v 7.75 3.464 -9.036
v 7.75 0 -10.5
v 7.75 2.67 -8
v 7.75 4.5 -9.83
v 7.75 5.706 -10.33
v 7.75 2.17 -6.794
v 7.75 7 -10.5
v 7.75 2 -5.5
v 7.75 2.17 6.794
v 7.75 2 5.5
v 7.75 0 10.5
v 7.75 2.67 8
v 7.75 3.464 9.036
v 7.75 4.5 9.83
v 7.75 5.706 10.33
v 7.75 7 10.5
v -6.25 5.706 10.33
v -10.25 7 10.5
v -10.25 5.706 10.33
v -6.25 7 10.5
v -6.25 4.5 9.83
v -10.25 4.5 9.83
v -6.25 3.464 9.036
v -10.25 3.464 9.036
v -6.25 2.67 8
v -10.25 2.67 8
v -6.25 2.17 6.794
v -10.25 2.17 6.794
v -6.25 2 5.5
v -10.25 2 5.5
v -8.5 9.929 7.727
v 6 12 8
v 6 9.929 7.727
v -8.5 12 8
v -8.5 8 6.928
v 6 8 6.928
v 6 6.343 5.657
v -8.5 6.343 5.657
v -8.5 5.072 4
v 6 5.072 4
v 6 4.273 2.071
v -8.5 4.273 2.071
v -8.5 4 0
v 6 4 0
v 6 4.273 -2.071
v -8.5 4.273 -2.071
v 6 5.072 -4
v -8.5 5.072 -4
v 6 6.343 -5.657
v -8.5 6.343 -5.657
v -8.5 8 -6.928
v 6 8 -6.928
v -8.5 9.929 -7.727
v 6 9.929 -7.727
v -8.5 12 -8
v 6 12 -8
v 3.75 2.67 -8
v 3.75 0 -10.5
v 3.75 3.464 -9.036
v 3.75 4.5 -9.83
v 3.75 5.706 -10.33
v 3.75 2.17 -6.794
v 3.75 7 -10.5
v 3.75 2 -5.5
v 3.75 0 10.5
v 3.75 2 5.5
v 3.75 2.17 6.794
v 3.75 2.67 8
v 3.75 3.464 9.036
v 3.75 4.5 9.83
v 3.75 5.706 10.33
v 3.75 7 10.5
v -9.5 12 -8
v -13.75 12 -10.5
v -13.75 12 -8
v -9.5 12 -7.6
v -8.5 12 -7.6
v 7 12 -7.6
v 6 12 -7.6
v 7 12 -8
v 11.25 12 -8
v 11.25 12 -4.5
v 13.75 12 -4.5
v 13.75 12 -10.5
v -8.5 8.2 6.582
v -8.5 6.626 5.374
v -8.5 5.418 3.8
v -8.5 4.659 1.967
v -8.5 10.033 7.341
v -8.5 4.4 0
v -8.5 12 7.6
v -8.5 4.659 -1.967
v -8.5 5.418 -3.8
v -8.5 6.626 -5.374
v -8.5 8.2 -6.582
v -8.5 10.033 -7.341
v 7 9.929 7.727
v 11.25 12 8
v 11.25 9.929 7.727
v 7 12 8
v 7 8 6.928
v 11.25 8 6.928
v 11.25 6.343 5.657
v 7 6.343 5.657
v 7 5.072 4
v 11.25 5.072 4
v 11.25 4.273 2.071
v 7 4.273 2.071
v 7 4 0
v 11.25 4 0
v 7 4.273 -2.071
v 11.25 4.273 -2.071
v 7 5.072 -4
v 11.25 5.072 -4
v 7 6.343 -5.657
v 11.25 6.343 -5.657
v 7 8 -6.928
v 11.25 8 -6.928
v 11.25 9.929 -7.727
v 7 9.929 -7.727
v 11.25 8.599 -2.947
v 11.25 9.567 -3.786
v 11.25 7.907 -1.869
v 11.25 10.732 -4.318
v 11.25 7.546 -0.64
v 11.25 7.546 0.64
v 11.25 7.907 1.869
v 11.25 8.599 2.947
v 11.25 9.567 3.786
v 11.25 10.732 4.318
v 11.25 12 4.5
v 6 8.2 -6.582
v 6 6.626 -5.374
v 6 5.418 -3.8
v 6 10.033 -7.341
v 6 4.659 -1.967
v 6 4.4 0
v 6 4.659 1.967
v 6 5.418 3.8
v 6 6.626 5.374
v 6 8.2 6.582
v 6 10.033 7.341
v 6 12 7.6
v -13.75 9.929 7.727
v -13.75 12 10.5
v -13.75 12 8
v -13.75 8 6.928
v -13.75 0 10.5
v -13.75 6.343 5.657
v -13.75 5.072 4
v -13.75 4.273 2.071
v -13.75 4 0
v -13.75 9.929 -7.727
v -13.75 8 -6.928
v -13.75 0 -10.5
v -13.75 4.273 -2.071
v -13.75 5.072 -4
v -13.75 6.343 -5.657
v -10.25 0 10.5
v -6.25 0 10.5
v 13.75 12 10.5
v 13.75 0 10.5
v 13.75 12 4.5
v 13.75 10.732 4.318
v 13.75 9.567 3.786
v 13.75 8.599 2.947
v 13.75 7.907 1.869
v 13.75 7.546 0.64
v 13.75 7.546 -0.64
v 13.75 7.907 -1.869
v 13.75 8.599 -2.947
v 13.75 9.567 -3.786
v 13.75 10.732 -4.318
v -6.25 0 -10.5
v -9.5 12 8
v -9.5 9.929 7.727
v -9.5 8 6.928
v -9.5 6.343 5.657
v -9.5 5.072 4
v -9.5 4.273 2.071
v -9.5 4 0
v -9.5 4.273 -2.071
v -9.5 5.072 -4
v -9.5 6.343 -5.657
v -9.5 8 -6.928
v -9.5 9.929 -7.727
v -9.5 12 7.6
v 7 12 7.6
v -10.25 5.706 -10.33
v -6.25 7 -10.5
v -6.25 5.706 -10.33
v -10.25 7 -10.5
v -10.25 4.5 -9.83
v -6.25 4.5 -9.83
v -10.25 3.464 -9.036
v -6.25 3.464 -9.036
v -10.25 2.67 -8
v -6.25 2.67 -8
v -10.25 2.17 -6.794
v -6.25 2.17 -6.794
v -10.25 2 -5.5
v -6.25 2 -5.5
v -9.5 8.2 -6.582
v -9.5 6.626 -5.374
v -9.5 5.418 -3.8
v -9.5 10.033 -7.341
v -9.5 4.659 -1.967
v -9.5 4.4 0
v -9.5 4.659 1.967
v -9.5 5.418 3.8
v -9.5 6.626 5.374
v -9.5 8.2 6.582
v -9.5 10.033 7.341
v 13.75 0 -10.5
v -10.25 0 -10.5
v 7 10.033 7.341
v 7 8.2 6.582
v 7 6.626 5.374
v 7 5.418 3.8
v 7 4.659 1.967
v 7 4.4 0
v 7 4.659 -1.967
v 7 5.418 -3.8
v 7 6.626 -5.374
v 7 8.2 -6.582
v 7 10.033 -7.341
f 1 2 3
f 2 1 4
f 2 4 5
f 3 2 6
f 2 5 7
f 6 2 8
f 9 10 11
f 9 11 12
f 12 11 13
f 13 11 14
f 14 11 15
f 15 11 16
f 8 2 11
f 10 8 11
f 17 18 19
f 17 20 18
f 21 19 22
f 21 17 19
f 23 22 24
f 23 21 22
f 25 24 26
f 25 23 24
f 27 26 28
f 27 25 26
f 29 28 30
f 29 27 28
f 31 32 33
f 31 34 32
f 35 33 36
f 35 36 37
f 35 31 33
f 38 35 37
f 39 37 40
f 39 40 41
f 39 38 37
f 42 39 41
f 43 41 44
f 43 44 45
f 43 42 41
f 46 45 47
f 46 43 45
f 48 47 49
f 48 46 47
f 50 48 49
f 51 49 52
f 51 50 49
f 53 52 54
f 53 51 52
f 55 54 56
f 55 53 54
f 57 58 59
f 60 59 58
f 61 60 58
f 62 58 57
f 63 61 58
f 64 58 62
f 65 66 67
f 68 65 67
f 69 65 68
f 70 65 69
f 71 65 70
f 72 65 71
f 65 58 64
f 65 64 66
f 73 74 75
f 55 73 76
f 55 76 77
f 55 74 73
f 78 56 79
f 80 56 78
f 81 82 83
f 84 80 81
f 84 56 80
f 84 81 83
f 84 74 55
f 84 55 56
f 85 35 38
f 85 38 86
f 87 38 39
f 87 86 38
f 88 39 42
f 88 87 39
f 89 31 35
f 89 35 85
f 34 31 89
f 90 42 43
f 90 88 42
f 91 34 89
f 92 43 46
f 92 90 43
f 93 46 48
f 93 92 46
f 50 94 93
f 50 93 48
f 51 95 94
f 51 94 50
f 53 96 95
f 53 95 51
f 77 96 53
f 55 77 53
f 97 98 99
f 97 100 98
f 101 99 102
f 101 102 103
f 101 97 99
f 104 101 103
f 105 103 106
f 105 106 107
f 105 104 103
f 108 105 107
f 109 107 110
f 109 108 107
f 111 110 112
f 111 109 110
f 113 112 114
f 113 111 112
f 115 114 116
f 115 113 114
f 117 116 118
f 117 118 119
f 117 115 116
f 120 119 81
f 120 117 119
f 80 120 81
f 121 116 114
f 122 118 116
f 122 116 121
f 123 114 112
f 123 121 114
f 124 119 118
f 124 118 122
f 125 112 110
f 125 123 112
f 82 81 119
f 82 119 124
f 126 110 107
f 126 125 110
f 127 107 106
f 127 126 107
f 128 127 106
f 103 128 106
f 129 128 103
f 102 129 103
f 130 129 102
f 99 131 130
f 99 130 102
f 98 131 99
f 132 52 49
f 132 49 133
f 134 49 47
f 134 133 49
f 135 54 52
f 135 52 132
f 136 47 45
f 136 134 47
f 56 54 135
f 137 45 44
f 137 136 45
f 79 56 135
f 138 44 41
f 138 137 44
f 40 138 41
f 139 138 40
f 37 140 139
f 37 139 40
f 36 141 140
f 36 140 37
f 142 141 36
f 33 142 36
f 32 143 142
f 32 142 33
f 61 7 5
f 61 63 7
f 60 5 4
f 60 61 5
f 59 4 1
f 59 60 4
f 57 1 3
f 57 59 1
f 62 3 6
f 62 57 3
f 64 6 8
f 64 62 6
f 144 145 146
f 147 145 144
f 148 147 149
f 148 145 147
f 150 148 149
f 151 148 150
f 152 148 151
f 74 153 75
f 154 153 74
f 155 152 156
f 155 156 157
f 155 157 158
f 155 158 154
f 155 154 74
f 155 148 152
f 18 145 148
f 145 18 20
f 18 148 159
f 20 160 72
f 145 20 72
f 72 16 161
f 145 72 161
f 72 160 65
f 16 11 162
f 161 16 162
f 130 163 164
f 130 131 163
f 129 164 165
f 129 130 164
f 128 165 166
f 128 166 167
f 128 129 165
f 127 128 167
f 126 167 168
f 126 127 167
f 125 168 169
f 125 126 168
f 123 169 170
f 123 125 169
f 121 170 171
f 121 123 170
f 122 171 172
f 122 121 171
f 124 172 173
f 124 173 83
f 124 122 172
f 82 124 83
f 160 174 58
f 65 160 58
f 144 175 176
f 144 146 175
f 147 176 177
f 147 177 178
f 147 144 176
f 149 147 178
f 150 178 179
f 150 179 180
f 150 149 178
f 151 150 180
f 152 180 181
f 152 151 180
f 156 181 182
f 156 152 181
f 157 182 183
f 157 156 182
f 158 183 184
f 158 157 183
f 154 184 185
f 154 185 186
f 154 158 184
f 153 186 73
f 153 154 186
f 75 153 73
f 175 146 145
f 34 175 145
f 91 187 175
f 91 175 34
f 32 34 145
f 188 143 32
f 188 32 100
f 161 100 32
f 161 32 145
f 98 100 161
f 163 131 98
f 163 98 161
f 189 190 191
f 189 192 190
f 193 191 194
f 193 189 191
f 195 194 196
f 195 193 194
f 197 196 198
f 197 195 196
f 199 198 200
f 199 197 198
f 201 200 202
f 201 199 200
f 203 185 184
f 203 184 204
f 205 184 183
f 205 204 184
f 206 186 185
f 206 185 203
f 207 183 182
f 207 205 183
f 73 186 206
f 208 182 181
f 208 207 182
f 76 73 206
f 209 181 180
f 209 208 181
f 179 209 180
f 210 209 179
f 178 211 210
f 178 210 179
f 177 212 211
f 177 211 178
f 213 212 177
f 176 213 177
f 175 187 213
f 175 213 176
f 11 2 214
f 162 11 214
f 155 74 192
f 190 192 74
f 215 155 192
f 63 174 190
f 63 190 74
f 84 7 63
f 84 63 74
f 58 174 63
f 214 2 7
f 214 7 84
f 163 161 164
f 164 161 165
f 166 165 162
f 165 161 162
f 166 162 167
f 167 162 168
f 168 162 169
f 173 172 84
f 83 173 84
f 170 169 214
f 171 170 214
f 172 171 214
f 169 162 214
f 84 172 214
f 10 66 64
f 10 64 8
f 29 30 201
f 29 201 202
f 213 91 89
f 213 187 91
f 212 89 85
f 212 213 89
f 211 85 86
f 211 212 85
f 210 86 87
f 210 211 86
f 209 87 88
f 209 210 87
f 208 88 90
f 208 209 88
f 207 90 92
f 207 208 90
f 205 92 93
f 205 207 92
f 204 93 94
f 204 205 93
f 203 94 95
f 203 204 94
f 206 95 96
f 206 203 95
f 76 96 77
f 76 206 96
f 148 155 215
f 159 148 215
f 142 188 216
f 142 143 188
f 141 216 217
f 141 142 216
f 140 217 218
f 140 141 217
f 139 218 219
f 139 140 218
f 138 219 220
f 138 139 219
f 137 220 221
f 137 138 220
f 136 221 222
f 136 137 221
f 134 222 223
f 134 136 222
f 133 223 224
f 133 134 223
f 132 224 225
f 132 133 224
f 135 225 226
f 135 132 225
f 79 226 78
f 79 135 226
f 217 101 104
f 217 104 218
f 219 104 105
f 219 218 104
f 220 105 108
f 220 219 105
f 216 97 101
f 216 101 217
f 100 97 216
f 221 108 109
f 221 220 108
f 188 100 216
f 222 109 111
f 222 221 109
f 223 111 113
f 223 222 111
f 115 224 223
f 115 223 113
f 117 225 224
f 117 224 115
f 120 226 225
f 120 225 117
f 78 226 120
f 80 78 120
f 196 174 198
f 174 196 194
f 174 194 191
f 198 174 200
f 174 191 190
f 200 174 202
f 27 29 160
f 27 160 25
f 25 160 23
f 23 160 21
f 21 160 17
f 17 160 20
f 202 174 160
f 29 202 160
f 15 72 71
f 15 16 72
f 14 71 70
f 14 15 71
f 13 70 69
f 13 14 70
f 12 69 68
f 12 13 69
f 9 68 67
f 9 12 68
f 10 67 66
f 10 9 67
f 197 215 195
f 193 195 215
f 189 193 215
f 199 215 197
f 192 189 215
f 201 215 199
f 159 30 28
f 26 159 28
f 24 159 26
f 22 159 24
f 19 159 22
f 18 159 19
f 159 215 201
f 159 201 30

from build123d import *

# Parameters (mm, degrees)
SKETCH1_W           = 27.5
SKETCH1_H           = 21
BOSS_EXTRUDE1_DEPTH = 12
SKETCH4_W           = 4
SKETCH4_H           = 2
CUT_EXTRUDE1_DEPTH  = 28.821978722
FILLET1_R           = 5


with BuildPart() as part:
    # Sketch1 → Boss-Extrude1 (new body)
    with BuildSketch(Plane(origin=(0, 0, 0), x_dir=(1, 0, 0), z_dir=(0, 1, 0))):
        Rectangle(SKETCH1_W, SKETCH1_H)
    extrude(amount=BOSS_EXTRUDE1_DEPTH)

    # Sketch2 → Cut-Revolve1 (revolve, cut)
    with BuildSketch(Plane(origin=(0, 12, 0), x_dir=(1, 0, 0), z_dir=(0, 1, 0))):
        Polygon((-13.75, 0), (13.75, 0), (13.75, 4.5), (11.25, 4.5), (11.25, 8), (7, 8), (7, 7.6), (6, 7.6), (6, 8), (-8.5, 8), (-8.5, 7.6), (-9.5, 7.6), (-9.5, 8), (-13.75, 8), align=None)
    revolve(axis=Axis((-13.75, 12, 0), (1, 0, 0)), mode=Mode.SUBTRACT)

    # Sketch4 → Cut-Extrude1 (cut, through all)
    with BuildSketch(Plane.XY.offset(10.5)):
        with Locations((-8.25, 1)):
            Rectangle(SKETCH4_W, SKETCH4_H)
        with Locations((5.75, 1)):
            Rectangle(SKETCH4_W, SKETCH4_H)
    extrude(amount=-CUT_EXTRUDE1_DEPTH, mode=Mode.SUBTRACT)

    # Fillet1
    fillet1_edges = [part.edges().sort_by_distance(p)[0] for p in [
        (-8.25, 2, -10.5),
        (-8.25, 2, 10.5),
        (5.75, 2, -10.5),
        (5.75, 2, 10.5),
    ]]
    fillet(fillet1_edges, radius=FILLET1_R)


solid = part.part
